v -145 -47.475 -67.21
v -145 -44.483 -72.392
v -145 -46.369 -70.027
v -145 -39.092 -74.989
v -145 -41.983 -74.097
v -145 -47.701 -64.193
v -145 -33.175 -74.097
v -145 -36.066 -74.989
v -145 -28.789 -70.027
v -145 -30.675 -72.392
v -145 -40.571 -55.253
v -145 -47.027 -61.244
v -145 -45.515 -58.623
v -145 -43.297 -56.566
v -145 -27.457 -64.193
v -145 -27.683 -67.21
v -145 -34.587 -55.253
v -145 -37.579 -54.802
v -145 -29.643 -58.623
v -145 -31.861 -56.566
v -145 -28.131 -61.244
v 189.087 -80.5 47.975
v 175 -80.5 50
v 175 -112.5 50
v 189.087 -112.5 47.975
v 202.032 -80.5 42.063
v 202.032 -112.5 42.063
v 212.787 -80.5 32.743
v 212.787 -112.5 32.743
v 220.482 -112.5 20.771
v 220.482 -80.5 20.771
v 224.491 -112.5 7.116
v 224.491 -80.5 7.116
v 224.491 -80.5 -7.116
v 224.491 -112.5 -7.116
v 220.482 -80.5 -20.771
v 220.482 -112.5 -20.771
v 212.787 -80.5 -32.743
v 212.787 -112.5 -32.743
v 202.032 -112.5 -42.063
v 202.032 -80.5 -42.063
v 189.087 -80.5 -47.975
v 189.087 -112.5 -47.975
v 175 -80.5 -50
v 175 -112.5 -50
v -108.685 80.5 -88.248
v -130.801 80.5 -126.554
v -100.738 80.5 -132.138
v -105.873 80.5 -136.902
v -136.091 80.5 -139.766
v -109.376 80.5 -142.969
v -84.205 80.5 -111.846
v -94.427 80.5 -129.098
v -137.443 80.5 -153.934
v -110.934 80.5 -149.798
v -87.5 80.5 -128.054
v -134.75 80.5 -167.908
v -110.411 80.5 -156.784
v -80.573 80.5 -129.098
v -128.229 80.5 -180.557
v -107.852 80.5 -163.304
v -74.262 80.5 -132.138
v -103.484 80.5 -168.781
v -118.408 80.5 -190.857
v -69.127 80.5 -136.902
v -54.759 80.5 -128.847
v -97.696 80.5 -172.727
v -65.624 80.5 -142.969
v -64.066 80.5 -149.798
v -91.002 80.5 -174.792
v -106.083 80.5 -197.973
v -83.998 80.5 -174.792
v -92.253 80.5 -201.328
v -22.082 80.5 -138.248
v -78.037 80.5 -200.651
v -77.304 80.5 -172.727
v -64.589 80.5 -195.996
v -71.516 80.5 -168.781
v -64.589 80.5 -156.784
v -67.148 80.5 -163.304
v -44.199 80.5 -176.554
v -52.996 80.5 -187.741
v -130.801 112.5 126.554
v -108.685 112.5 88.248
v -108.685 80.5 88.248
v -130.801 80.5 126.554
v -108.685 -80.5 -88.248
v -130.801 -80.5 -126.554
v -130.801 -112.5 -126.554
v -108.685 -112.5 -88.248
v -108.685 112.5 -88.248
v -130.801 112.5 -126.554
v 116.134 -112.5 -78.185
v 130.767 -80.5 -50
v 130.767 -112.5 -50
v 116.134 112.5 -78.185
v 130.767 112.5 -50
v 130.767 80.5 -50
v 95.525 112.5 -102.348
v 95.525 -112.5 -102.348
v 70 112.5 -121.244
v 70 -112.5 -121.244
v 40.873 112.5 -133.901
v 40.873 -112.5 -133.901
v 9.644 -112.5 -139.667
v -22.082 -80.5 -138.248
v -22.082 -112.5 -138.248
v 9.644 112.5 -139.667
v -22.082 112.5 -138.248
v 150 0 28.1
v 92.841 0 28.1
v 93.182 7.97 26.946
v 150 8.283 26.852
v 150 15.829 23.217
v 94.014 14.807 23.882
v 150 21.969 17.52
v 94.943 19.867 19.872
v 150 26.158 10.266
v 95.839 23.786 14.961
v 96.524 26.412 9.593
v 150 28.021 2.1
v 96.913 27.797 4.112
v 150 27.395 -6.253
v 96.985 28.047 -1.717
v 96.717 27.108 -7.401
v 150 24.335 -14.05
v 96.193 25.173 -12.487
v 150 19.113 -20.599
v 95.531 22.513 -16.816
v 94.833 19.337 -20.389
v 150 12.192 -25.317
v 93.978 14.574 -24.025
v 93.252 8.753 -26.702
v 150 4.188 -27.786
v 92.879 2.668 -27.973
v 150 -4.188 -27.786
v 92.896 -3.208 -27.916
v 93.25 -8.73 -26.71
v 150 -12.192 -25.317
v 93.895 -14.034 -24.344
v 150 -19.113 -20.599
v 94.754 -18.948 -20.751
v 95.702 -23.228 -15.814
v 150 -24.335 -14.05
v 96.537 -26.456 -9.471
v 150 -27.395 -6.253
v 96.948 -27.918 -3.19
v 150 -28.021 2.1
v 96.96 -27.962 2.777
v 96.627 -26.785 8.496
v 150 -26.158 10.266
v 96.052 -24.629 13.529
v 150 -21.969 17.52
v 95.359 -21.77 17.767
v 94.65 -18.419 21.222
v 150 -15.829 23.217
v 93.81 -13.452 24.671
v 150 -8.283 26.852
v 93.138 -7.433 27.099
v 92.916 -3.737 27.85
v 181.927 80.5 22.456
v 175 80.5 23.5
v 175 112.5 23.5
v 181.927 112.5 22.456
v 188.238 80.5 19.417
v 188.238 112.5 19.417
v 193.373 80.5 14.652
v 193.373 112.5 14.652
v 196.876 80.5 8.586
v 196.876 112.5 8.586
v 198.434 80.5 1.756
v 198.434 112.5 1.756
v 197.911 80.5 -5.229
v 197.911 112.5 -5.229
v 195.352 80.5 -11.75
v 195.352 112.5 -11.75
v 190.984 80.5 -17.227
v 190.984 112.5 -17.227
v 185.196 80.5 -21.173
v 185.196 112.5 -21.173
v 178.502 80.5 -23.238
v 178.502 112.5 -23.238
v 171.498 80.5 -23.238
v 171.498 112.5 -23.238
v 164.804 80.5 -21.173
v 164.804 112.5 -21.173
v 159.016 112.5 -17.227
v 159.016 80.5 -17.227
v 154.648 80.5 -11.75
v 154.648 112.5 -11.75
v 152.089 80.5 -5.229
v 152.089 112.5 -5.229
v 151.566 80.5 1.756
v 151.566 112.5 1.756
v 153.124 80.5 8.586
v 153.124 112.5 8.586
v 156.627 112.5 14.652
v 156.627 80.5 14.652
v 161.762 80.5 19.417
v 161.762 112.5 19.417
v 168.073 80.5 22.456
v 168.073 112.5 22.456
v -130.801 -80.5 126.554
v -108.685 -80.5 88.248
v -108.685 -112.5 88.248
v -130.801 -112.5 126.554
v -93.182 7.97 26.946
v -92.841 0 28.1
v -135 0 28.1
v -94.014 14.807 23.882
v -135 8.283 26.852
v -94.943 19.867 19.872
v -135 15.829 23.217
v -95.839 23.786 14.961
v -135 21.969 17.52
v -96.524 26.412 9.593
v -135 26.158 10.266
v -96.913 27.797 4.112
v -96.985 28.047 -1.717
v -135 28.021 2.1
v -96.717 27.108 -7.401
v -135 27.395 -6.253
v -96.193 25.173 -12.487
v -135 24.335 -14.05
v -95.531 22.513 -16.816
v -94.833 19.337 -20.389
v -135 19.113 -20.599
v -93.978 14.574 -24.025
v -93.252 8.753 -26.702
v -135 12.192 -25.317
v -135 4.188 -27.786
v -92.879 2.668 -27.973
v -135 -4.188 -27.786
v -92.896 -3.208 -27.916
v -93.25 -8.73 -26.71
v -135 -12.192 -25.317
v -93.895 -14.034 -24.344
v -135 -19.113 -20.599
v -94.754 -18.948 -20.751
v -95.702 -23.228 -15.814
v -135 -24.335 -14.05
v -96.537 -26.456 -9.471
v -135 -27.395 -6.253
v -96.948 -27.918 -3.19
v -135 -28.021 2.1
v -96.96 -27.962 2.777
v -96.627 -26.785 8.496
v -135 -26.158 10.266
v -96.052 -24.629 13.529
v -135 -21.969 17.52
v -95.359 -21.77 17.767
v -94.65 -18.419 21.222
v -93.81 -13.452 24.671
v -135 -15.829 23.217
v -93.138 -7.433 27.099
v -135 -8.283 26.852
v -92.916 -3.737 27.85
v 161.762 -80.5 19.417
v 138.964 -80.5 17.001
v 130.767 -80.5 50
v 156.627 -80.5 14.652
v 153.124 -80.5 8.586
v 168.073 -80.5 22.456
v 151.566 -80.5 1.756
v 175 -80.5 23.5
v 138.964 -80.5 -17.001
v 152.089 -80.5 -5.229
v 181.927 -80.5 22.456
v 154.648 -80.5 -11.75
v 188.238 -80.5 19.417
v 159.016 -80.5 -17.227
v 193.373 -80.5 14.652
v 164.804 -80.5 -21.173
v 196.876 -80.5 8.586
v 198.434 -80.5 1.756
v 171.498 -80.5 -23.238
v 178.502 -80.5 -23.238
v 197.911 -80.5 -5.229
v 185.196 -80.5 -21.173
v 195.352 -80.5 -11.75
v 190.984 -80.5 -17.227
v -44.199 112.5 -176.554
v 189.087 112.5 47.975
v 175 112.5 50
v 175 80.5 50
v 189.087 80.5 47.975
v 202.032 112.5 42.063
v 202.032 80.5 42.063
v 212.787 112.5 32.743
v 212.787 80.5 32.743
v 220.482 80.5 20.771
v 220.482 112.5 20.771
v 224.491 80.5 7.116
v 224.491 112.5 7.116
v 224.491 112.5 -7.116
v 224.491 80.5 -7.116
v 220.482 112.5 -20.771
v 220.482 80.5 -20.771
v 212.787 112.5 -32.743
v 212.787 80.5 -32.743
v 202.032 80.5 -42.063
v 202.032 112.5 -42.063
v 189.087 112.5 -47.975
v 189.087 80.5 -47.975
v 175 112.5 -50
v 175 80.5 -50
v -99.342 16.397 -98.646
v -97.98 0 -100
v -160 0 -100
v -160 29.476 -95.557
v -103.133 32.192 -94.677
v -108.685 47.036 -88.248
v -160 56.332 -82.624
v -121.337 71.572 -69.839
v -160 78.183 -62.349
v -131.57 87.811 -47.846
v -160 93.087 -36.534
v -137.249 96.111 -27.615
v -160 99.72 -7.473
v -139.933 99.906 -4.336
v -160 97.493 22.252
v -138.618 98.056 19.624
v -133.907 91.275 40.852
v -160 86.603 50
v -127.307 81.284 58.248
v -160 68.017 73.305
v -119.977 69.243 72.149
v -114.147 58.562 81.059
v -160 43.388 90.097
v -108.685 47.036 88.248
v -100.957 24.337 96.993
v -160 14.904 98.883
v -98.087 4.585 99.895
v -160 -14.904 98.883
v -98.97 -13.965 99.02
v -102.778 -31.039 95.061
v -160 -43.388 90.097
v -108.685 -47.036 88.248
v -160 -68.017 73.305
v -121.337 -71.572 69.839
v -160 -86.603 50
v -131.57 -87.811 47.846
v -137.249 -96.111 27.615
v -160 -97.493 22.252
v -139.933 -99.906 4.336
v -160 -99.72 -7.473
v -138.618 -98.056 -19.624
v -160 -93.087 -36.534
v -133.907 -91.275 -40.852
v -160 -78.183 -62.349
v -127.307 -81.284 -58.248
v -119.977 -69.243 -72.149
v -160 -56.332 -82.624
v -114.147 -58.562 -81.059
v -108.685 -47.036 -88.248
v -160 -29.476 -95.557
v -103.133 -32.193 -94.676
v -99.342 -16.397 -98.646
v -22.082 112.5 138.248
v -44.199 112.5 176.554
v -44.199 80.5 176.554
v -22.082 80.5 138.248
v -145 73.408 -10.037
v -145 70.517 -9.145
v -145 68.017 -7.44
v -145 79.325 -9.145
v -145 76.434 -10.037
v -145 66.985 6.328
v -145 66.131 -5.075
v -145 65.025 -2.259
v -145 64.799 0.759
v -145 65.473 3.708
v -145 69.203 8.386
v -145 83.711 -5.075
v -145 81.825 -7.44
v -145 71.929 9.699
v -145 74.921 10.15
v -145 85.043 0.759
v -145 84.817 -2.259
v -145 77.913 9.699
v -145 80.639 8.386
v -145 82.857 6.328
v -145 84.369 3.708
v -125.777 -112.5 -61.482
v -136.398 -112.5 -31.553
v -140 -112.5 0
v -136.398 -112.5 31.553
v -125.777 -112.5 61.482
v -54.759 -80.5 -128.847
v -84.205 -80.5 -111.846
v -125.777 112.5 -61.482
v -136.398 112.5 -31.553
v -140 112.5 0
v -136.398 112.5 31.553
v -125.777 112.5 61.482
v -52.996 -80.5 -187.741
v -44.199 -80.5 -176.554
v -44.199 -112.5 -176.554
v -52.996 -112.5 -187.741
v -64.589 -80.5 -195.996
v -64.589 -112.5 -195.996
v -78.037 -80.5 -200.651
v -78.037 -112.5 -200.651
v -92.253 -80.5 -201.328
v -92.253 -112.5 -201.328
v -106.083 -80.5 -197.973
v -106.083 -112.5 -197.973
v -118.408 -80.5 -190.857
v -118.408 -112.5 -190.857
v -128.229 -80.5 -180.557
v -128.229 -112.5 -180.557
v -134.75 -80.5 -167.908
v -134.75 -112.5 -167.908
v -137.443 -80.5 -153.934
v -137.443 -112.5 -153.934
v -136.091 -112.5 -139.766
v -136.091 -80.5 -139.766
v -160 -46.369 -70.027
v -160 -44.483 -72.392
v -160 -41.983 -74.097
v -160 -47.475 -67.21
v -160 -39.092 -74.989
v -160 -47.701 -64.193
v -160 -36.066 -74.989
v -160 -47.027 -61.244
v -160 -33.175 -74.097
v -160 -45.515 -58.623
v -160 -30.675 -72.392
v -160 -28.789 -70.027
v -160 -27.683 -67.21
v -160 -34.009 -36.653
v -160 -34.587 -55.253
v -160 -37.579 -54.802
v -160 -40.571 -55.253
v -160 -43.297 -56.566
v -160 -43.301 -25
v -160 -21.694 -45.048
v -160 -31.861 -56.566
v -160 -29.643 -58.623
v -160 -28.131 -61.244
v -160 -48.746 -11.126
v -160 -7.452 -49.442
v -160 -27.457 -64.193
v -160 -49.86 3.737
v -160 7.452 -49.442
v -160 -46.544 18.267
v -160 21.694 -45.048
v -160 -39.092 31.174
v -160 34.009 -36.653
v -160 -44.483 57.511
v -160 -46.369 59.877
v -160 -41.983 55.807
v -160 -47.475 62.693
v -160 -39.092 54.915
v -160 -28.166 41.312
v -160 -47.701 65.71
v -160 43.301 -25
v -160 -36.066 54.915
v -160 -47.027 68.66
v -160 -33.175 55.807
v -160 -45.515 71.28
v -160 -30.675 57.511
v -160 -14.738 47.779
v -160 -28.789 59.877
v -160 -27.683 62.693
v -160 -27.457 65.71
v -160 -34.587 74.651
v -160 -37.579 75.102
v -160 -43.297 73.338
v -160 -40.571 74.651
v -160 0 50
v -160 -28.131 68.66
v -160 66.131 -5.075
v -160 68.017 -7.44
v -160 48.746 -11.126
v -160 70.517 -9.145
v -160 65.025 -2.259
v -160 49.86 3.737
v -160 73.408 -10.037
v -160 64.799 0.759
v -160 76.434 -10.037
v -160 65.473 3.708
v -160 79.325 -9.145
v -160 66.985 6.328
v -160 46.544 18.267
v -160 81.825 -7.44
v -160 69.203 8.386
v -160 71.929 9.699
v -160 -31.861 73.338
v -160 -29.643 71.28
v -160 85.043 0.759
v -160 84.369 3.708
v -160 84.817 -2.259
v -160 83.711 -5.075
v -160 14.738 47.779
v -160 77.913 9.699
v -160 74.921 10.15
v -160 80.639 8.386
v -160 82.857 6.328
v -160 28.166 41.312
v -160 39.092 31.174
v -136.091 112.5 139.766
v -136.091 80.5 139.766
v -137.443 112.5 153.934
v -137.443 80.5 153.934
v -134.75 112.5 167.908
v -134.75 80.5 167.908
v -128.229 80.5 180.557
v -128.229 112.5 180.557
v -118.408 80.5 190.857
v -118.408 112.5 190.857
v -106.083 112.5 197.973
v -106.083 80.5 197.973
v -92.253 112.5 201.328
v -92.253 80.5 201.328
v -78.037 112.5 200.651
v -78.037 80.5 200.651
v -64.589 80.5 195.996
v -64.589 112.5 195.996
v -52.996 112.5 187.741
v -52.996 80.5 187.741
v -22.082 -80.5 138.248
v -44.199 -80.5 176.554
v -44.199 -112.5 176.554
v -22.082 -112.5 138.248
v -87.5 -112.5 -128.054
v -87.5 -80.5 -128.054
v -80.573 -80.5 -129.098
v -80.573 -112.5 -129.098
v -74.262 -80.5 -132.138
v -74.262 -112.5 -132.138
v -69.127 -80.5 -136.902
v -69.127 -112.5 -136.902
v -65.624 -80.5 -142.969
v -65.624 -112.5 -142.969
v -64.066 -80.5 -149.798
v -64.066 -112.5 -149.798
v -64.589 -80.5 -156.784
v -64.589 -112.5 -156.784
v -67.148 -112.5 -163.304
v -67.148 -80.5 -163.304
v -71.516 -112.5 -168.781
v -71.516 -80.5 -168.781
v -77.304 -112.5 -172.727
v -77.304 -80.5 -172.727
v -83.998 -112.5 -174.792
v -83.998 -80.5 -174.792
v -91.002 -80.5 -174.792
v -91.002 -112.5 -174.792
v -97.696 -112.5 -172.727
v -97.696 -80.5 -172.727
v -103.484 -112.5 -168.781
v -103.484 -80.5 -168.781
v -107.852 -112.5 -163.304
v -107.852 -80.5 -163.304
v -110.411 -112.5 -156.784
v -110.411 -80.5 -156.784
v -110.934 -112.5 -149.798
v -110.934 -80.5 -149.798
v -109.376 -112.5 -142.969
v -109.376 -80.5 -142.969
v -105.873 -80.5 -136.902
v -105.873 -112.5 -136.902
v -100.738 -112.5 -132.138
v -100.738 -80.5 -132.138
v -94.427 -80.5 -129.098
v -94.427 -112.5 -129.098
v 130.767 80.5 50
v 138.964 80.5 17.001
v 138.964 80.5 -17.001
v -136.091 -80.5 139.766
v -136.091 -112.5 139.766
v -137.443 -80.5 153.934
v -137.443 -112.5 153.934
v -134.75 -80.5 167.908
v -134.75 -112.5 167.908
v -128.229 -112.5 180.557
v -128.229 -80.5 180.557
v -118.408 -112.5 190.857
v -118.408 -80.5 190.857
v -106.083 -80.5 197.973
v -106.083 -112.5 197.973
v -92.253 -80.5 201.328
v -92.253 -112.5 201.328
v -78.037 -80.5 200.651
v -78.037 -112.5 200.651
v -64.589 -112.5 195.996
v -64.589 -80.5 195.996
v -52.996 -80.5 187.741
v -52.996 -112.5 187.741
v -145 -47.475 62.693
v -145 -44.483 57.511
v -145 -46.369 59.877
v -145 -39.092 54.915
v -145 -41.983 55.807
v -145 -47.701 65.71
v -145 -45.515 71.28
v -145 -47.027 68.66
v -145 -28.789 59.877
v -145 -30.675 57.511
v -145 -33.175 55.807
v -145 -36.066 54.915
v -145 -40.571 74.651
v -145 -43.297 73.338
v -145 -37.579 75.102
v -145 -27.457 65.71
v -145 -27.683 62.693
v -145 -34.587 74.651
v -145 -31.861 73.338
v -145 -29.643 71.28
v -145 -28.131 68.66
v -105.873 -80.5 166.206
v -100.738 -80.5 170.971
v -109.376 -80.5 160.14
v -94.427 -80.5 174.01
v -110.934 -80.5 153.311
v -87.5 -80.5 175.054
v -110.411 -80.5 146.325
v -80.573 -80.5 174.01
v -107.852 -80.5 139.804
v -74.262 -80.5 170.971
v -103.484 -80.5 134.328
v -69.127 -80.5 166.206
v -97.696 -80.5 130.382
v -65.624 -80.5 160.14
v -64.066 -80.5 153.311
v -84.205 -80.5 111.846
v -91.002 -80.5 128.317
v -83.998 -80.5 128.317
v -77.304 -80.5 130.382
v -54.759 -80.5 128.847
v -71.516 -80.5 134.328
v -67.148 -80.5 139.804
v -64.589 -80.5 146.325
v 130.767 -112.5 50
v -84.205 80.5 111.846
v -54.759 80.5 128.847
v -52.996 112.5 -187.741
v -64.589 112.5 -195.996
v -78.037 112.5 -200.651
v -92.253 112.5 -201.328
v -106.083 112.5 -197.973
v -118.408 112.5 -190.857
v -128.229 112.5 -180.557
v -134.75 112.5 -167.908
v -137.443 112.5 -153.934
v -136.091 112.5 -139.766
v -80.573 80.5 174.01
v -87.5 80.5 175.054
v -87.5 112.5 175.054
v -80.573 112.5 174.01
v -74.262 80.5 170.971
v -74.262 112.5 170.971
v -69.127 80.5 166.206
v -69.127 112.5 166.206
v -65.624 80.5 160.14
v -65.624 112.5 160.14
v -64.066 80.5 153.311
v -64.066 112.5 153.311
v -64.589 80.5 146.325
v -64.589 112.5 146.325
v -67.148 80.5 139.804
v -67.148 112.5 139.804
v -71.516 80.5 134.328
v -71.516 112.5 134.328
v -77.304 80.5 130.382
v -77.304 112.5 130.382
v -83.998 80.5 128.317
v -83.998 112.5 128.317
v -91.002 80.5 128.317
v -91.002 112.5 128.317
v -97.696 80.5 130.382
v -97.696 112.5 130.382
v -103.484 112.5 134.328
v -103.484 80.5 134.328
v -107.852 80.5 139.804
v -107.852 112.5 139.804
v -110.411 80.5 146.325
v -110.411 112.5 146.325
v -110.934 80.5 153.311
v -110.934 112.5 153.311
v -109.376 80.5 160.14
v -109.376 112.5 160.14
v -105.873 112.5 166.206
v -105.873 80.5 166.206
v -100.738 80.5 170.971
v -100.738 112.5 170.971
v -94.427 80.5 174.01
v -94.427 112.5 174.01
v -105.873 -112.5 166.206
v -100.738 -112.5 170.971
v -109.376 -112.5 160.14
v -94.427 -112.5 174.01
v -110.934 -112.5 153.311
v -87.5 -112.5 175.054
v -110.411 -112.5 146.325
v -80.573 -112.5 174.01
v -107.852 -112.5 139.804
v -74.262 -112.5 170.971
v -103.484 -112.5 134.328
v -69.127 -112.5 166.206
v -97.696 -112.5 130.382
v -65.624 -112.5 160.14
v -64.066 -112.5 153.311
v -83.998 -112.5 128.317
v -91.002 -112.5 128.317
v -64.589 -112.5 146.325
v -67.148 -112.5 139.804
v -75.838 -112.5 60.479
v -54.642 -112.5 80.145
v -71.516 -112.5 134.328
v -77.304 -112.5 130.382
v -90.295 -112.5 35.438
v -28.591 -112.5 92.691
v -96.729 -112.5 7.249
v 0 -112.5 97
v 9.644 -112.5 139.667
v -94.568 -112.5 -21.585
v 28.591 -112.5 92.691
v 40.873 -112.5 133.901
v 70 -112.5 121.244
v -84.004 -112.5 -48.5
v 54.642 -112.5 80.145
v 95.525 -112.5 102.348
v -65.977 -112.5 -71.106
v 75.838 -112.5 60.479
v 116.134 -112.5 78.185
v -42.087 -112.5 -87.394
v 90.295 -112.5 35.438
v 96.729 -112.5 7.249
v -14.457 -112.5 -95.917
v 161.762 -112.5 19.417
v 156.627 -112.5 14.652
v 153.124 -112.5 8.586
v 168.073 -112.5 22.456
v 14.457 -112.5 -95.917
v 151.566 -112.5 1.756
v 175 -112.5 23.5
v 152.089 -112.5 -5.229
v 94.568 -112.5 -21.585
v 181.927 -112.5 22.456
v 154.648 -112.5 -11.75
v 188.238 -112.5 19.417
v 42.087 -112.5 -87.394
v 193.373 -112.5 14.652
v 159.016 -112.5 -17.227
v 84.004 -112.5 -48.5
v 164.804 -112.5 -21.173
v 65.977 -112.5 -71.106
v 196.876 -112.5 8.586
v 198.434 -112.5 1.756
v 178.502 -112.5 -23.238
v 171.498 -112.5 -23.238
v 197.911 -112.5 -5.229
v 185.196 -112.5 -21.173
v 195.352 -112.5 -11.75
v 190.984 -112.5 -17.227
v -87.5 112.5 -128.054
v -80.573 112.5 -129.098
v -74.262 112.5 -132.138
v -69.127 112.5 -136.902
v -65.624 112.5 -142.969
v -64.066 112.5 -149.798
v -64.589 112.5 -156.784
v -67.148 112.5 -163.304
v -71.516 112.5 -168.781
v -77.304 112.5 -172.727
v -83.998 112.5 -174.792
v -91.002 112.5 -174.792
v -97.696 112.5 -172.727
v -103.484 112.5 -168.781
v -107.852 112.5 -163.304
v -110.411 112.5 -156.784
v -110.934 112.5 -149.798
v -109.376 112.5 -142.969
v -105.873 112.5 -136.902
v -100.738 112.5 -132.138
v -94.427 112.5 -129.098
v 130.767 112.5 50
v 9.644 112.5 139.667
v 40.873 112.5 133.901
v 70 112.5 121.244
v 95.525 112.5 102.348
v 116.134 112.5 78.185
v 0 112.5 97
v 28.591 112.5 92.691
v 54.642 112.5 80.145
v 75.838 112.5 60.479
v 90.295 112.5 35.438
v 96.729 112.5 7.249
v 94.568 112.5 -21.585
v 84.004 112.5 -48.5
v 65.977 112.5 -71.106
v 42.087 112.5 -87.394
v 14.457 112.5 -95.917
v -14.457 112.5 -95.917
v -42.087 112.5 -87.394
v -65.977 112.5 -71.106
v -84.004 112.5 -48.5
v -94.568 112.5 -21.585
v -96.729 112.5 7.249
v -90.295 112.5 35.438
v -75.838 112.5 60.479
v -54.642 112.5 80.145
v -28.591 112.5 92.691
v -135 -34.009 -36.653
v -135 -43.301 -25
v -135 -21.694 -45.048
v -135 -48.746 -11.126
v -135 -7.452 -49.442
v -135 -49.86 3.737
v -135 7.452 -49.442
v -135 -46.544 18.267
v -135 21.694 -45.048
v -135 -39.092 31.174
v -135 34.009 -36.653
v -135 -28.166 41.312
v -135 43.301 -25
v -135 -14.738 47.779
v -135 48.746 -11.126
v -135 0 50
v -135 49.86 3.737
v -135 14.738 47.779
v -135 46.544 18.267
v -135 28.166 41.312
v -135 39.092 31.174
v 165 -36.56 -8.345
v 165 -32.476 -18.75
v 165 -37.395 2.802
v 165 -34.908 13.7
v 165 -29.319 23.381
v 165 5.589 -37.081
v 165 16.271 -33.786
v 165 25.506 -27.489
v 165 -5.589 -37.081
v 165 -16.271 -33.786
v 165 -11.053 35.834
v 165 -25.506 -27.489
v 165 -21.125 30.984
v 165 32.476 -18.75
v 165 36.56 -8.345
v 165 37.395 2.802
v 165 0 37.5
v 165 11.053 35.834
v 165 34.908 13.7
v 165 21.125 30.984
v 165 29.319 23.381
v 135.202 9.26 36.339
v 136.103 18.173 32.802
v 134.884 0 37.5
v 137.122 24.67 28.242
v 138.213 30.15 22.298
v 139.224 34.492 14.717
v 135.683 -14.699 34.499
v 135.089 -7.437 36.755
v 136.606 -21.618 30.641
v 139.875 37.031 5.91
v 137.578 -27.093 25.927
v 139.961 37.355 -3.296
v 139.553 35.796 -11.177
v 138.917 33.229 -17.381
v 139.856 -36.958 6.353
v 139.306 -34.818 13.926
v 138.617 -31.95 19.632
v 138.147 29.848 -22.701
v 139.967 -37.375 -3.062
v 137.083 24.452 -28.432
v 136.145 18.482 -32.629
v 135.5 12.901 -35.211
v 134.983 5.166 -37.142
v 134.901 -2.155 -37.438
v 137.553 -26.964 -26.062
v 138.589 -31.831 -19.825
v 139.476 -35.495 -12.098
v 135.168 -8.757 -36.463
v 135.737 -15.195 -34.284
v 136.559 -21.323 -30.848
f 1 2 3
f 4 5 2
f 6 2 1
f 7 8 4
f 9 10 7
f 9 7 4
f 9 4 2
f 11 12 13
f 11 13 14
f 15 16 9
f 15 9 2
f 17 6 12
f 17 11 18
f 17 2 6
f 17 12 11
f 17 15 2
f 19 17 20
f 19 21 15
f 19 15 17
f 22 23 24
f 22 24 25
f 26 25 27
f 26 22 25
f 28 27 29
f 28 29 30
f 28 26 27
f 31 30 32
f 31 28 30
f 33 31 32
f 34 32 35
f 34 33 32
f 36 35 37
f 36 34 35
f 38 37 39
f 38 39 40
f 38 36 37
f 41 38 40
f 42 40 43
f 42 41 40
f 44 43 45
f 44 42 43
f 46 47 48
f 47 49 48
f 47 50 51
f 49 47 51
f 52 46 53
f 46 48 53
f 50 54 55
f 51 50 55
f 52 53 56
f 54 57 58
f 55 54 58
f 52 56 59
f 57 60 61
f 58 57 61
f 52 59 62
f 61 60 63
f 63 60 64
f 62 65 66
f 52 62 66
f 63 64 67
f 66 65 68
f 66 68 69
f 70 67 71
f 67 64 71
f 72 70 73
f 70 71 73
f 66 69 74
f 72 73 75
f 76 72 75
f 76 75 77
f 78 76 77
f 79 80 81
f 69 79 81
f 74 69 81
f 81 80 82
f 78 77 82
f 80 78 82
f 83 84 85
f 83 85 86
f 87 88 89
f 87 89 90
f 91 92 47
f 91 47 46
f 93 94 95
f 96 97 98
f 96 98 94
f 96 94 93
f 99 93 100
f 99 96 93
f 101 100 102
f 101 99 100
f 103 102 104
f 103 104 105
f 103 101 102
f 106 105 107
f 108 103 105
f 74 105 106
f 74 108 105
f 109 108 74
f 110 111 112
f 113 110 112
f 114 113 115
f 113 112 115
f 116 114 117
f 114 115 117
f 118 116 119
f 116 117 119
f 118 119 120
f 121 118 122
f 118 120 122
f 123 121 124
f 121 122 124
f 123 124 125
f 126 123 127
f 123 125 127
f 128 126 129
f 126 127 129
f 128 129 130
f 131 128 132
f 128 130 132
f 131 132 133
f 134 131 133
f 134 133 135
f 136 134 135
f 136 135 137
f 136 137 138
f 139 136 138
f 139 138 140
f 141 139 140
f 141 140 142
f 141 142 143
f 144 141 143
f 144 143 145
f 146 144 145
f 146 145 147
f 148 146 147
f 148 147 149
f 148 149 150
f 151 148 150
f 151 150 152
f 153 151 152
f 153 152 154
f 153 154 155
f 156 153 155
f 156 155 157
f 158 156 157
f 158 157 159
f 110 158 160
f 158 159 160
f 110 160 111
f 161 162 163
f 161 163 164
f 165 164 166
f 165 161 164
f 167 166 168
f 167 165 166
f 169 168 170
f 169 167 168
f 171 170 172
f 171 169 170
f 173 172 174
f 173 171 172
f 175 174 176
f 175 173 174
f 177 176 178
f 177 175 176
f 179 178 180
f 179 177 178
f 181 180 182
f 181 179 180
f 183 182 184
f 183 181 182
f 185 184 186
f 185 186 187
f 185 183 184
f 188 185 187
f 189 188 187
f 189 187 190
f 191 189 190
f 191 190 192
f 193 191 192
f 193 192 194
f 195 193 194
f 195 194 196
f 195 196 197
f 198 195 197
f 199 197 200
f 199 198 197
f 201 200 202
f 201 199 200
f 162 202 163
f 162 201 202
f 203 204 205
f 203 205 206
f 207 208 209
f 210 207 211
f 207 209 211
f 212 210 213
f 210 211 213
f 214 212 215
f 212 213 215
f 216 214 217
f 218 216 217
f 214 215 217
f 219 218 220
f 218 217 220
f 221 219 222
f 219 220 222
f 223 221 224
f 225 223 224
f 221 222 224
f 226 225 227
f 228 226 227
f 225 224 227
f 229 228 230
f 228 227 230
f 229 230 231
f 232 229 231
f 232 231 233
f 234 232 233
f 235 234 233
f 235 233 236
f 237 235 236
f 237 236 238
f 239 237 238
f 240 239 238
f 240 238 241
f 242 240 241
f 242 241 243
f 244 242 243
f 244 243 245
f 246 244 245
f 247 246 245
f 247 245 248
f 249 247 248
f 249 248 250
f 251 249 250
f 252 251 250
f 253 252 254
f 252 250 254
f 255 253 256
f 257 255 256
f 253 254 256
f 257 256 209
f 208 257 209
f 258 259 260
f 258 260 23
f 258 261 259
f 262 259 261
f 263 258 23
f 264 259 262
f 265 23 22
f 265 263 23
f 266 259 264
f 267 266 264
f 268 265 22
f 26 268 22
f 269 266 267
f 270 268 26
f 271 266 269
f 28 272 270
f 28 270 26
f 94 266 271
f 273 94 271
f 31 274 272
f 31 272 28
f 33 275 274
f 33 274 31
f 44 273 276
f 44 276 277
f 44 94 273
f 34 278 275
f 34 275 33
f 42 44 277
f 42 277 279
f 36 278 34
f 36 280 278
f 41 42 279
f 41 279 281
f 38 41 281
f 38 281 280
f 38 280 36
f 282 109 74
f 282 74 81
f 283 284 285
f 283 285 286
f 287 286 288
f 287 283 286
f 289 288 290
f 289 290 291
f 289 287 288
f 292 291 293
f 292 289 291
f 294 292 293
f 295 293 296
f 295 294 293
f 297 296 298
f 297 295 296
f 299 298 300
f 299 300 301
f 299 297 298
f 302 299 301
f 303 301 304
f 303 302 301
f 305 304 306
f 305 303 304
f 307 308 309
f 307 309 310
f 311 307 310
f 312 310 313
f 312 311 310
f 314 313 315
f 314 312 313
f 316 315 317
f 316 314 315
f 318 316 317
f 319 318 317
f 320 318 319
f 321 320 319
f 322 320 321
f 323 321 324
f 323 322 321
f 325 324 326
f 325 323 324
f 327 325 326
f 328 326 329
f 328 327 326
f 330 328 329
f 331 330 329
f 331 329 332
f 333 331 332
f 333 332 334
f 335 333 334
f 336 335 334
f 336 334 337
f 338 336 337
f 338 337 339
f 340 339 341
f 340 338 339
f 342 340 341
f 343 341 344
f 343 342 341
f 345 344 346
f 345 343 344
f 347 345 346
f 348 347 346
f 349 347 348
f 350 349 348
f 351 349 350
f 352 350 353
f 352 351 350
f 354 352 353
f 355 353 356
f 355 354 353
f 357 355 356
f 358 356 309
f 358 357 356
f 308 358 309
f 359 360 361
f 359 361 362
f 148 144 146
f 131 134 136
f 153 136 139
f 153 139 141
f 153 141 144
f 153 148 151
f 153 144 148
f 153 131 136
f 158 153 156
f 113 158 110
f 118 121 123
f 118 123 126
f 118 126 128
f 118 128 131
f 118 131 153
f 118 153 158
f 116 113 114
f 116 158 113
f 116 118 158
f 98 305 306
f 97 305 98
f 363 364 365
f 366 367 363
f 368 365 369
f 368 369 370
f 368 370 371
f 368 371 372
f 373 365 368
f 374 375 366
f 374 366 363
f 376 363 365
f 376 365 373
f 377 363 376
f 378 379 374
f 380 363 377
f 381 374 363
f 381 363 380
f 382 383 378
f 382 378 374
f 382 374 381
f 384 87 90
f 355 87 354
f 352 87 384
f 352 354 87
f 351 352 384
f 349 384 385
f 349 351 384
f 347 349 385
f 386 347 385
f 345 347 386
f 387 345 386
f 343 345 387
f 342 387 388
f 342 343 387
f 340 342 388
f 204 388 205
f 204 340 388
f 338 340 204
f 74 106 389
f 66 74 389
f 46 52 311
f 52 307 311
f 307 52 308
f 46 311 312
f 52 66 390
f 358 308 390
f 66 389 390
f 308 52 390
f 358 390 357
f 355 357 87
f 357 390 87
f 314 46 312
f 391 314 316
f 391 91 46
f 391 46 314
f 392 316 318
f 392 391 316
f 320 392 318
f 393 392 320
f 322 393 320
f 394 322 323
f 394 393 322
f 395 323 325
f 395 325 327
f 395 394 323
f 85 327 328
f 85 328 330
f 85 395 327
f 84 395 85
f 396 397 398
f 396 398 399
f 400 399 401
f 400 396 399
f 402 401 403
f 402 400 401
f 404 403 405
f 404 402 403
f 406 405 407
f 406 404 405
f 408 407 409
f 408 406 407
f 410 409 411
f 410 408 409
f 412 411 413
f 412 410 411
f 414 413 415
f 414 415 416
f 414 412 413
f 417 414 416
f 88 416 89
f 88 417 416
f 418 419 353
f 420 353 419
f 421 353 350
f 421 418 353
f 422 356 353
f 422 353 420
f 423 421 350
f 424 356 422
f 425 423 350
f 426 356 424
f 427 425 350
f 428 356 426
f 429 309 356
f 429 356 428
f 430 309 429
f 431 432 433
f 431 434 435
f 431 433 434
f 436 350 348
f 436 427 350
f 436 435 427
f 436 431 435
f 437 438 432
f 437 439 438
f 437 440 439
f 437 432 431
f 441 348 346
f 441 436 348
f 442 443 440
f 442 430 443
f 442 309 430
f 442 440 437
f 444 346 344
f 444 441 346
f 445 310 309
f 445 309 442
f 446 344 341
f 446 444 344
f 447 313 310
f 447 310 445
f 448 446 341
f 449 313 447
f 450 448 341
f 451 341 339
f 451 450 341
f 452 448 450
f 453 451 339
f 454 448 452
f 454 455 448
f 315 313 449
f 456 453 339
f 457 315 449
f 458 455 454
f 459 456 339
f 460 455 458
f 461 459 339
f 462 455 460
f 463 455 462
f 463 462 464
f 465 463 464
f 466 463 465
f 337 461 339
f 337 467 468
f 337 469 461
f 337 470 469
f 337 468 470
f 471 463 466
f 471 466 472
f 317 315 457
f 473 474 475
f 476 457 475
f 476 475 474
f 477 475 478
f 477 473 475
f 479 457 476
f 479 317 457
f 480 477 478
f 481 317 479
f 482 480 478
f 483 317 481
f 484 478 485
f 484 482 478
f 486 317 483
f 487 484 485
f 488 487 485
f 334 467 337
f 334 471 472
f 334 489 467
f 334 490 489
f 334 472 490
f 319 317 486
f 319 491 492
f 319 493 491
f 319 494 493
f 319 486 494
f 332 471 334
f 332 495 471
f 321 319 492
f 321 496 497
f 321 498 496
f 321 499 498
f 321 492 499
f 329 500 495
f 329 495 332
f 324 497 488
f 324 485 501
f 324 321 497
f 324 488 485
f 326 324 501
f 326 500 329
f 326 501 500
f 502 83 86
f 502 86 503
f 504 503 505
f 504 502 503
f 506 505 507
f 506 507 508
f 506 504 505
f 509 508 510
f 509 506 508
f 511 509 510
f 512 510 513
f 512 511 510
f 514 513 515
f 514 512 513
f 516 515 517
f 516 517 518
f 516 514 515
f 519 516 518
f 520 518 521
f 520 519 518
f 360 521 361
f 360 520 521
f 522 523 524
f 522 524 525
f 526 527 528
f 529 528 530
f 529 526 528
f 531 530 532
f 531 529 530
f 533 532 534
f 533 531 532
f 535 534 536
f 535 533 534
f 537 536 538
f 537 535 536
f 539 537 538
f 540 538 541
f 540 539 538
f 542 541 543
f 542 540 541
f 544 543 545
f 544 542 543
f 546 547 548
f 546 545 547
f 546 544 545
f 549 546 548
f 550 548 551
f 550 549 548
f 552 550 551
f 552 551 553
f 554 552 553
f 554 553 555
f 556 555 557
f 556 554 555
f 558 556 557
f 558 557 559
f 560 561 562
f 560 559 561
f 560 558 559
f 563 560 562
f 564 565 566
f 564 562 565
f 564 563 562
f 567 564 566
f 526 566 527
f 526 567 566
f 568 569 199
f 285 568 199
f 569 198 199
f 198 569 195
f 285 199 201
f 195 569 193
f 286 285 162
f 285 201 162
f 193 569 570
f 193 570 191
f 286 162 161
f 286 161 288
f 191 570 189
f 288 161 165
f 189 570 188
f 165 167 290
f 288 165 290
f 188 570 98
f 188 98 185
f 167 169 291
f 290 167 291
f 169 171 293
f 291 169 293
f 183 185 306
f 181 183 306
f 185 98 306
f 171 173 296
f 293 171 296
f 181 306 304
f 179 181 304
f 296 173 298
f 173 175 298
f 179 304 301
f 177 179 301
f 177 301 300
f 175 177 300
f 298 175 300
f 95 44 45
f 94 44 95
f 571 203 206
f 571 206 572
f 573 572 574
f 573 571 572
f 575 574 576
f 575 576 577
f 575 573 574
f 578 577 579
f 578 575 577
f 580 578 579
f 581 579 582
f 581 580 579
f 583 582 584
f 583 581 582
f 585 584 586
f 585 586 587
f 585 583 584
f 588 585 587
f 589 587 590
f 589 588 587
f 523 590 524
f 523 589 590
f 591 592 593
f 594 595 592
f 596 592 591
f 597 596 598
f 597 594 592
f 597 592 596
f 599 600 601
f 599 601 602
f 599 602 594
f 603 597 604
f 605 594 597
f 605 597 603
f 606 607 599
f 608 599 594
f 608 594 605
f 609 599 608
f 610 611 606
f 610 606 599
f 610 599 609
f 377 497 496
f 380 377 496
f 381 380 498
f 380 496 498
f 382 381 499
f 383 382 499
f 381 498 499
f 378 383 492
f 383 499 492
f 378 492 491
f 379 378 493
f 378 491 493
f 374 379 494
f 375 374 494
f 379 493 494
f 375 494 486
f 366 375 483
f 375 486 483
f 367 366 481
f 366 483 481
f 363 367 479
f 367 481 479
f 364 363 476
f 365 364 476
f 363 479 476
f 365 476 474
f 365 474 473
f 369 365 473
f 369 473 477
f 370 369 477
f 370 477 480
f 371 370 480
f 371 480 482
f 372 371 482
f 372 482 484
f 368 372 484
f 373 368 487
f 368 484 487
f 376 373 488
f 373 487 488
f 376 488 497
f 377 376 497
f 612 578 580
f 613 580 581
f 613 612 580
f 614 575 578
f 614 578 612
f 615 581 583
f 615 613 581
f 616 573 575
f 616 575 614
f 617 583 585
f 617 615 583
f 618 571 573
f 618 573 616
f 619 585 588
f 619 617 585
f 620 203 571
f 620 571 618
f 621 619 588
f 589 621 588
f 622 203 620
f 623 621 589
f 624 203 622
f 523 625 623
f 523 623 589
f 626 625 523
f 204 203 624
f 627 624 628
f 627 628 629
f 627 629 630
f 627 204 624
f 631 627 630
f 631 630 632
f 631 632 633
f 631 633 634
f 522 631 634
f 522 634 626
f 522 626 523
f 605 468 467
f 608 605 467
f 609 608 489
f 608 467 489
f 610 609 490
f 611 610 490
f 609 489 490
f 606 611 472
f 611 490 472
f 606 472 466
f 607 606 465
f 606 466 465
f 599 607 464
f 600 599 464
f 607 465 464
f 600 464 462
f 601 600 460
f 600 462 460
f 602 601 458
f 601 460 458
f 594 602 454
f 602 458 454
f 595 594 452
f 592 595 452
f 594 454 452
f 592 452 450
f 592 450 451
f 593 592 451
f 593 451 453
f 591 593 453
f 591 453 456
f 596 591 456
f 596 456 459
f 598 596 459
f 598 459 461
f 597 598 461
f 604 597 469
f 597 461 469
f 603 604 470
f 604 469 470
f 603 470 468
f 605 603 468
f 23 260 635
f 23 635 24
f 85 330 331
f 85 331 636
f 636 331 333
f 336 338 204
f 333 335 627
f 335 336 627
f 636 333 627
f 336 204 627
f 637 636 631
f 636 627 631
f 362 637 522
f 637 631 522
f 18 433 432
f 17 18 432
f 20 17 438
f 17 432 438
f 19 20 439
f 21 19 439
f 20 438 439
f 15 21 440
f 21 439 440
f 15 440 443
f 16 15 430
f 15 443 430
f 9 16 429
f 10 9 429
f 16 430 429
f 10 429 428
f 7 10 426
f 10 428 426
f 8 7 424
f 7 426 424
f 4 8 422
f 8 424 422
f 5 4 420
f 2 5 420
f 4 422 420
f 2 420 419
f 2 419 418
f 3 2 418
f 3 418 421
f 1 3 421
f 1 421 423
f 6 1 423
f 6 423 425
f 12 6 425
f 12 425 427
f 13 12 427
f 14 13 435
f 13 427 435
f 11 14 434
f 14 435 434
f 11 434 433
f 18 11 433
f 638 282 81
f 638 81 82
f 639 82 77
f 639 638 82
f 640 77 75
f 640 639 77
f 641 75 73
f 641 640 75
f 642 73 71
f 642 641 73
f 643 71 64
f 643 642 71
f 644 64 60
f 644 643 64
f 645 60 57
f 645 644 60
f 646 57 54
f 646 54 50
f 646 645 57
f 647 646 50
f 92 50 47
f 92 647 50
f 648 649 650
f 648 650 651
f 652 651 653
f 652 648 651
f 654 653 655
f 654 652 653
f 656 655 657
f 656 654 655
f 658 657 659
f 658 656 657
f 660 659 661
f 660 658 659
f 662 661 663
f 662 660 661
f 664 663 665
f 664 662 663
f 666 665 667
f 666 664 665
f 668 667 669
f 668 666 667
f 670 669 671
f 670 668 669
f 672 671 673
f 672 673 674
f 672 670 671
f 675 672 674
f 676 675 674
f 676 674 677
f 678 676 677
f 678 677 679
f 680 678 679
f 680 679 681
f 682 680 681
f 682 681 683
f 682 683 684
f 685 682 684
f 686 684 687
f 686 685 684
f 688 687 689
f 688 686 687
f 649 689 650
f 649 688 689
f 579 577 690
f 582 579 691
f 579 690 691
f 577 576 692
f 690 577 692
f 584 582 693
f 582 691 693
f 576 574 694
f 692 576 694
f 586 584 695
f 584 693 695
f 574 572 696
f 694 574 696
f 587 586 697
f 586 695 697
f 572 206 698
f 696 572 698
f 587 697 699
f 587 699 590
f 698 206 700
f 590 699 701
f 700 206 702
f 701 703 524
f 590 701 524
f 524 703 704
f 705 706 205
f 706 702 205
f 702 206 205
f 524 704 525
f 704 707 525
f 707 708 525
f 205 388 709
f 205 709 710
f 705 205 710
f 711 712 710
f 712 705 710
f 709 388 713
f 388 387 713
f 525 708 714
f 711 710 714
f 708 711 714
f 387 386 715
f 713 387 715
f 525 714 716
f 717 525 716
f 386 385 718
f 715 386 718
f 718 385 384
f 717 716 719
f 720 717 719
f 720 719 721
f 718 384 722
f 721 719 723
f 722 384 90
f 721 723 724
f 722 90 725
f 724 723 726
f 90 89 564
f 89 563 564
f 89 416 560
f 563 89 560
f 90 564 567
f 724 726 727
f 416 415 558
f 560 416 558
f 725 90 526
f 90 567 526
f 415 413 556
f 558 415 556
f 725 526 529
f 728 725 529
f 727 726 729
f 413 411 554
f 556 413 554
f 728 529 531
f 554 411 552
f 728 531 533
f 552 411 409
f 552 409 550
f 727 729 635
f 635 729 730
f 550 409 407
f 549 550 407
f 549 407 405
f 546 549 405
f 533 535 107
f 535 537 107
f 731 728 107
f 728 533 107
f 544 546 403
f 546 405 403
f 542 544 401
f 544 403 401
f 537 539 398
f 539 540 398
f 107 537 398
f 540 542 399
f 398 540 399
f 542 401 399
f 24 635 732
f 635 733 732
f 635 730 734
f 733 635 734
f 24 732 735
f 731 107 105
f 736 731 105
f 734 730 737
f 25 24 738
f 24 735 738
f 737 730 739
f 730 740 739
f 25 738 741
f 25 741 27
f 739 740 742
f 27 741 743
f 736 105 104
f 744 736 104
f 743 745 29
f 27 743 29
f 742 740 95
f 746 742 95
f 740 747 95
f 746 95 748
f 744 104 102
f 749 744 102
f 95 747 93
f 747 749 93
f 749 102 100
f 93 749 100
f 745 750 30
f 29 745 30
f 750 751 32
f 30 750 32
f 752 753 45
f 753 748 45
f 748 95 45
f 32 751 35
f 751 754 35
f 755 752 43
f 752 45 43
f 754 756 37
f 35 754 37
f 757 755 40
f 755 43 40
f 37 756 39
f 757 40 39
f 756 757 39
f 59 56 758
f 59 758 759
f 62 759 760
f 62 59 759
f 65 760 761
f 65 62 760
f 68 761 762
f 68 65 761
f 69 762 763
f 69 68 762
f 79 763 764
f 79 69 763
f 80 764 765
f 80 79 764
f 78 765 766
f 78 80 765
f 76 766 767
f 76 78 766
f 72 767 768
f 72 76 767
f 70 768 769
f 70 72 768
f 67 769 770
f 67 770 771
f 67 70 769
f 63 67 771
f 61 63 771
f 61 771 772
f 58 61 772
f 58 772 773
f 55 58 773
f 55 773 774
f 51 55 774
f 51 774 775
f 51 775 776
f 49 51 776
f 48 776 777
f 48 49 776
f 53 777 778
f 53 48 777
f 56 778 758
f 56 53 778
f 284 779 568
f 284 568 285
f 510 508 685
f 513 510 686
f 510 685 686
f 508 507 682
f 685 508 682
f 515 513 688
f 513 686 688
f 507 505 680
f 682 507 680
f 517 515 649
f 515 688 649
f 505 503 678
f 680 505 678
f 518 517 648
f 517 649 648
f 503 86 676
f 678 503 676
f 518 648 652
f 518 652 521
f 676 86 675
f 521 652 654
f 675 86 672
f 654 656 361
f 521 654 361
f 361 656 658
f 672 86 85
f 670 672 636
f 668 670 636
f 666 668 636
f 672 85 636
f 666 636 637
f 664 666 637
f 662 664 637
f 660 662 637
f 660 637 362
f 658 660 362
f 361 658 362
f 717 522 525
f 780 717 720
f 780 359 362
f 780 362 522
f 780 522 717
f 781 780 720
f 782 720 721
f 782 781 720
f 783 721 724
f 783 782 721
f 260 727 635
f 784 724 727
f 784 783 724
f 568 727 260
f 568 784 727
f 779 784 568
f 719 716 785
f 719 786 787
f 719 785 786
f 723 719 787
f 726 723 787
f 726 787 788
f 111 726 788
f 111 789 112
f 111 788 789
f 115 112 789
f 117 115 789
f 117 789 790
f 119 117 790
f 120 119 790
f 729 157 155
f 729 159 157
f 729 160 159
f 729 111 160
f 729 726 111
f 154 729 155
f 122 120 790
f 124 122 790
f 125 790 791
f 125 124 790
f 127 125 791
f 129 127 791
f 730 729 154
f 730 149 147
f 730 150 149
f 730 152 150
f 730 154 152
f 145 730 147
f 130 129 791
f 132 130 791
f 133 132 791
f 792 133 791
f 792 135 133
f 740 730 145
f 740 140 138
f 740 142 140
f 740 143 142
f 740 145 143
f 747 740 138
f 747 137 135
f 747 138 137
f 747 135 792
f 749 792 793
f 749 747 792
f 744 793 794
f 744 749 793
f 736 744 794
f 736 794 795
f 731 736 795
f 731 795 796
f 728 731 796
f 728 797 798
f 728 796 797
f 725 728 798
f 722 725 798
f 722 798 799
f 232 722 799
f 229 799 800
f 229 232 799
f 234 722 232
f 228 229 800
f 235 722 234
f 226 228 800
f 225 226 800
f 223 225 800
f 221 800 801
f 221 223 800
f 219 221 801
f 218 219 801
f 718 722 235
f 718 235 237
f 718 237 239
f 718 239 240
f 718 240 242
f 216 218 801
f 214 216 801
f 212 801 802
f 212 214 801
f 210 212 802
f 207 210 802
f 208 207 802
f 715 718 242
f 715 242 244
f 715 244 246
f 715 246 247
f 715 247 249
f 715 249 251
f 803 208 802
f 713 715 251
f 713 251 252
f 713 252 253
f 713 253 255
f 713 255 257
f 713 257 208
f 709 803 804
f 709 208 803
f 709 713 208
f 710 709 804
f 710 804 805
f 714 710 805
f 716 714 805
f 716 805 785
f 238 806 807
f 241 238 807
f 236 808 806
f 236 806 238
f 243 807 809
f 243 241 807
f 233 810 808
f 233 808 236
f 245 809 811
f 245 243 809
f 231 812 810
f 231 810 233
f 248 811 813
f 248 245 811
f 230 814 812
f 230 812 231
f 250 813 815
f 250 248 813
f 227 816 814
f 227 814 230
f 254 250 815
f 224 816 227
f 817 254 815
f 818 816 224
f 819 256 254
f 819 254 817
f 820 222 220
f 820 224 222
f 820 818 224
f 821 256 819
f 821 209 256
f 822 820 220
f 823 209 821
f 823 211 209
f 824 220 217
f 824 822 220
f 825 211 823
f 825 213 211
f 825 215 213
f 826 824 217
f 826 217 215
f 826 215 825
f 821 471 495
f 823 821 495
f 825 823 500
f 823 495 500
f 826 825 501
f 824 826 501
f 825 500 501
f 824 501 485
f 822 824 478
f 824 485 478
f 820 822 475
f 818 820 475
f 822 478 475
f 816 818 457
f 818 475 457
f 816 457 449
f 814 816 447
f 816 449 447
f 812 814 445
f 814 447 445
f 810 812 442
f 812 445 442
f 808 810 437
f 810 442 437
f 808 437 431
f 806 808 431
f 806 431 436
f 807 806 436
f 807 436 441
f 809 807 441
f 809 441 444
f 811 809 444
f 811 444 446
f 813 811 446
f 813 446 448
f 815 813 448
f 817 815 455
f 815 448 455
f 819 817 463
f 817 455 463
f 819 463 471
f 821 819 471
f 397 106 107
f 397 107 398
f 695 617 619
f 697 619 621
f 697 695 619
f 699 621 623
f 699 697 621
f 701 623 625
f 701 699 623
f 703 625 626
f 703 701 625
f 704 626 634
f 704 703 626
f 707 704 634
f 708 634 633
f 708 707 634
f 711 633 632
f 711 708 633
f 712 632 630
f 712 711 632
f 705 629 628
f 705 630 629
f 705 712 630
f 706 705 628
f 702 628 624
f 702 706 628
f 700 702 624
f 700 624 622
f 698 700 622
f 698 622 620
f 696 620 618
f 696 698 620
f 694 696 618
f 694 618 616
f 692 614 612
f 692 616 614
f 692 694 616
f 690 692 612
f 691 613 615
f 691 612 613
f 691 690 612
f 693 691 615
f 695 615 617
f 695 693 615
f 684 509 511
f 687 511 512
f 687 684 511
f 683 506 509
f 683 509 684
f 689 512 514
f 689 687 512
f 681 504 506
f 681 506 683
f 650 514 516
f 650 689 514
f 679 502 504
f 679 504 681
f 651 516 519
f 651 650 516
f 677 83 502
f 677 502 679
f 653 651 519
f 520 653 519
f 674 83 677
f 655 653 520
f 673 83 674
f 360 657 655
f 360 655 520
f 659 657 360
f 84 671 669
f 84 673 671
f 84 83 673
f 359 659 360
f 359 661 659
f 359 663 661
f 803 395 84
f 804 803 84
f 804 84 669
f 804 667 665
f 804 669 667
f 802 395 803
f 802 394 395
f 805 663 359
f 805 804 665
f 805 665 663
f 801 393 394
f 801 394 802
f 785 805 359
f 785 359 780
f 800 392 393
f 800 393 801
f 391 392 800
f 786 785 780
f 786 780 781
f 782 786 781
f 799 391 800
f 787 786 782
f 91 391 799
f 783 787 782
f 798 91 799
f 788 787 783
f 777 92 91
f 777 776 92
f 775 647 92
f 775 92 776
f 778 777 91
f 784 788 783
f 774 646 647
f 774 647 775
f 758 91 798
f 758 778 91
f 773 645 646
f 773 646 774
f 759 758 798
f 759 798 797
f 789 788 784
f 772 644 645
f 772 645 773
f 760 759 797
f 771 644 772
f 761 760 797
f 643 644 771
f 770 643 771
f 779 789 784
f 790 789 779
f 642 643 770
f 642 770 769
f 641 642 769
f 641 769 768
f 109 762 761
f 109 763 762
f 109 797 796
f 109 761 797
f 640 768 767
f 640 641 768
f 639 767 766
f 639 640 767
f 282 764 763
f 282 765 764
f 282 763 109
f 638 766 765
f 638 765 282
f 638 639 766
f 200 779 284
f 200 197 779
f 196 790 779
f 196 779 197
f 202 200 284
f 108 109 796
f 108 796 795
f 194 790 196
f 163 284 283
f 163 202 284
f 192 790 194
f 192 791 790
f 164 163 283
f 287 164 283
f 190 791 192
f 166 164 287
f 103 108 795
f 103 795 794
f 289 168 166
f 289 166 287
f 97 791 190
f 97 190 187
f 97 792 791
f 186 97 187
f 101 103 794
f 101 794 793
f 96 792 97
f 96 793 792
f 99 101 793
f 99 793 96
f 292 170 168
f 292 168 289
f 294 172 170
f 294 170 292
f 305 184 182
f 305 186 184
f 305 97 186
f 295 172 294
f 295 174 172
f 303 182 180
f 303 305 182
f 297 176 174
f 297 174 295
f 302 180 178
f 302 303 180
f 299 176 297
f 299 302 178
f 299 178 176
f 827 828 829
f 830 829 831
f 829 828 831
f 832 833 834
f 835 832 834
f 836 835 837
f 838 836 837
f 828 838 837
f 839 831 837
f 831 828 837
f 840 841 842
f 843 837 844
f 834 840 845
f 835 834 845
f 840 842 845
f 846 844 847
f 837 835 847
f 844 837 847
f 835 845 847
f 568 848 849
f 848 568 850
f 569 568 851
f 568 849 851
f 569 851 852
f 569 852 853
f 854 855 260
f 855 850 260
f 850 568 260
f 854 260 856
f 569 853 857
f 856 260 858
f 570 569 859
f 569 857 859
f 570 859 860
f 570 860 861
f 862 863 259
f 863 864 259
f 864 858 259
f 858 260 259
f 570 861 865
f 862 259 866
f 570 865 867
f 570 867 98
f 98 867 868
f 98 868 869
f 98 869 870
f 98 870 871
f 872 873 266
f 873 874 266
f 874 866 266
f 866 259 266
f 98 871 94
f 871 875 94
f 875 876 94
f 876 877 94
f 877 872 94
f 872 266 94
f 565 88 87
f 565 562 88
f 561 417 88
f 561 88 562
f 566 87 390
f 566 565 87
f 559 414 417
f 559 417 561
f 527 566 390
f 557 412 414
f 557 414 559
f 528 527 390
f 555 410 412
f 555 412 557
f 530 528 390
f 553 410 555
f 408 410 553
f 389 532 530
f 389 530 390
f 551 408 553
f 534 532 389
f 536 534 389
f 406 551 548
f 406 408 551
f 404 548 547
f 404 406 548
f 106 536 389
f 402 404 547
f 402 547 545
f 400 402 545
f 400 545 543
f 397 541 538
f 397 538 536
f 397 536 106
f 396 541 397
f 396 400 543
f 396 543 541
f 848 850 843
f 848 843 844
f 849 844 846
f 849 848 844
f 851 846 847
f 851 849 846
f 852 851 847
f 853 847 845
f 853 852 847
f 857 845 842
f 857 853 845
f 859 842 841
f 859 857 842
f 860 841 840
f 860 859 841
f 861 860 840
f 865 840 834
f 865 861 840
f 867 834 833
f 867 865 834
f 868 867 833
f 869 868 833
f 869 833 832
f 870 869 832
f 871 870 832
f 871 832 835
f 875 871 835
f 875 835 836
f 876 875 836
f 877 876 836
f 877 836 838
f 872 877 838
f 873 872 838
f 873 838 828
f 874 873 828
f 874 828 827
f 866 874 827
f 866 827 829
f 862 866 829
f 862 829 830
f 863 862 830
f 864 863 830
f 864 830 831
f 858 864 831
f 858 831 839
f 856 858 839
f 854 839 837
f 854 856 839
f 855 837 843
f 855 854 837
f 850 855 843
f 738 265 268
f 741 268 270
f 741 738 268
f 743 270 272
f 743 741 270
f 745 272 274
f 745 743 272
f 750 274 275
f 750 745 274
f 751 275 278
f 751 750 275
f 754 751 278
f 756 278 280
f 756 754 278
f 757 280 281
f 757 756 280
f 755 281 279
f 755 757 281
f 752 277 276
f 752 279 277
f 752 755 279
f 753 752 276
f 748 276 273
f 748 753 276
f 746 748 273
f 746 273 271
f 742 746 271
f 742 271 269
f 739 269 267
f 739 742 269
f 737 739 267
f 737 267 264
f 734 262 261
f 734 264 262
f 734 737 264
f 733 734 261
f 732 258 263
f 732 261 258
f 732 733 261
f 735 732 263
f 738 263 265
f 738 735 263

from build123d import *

# Parameters (mm, degrees)
SKETCH1_R               = 23.5
BOSS_EXTRUDE1_DEPTH     = 112.5
SKETCH2_OUTSIDE_W       = 484.702
SKETCH2_OUTSIDE_H       = 522.81
SKETCH2_OUTSIDE_R       = 140
CUT_EXTRUDE2_DEPTH      = 80.5
SKETCH3_R               = 100
BOSS_EXTRUDE2_DEPTH     = 160
SKETCH5_R               = 37.5
BOSS_EXTRUDE3_DEPTH     = 325
SKETCH6_R               = 28.1
CUT_EXTRUDE3_DEPTH      = 310
SKETCH7_R               = 50
CUT_EXTRUDE4_DEPTH      = 25
SKETCH8_R               = 10.15
CUT_EXTRUDE5_DEPTH      = 15
CUT_EXTRUDE6_DEPTH      = 323.343674653
CUT_EXTRUDE6_DEPTH_BACK = 323.343674653
SKETCH9_R               = 97


with BuildPart() as part:
    # Sketch1 → Boss-Extrude1 (new, symmetric)
    with BuildSketch(Plane(origin=(0, 0, 0), x_dir=(1, 0, 0), z_dir=(0, 1, 0))):
        with BuildLine():
            Line((175, 50), (130.766968306, 50))
            ThreePointArc((130.766968306, 50), (70, 121.24355653), (-22.082213964, 138.247516529))
            Line((-22.082213964, 138.247516529), (-44.198729811, 176.554445662))
            ThreePointArc((-44.198729811, 176.554445662), (-112.5, 194.855715852), (-130.801270189, 126.554445662))
            Line((-130.801270189, 126.554445662), (-108.684754342, 88.247516529))
            ThreePointArc((-108.684754342, 88.247516529), (-140, 0), (-108.684754342, -88.247516529))
            Line((-108.684754342, -88.247516529), (-130.801270189, -126.554445662))
            ThreePointArc((-130.801270189, -126.554445662), (-112.5, -194.855715851), (-44.198729811, -176.554445662))
            Line((-44.198729811, -176.554445662), (-22.082213964, -138.247516529))
            ThreePointArc((-22.082213964, -138.247516529), (70, -121.24355653), (130.766968306, -50))
            Line((130.766968306, -50), (175, -50))
            ThreePointArc((175, -50), (225, 0), (175, 50))
        make_face()
        with Locations(Location((175, 0, 0), (0, 0, 270))):
            Circle(SKETCH1_R, mode=Mode.SUBTRACT)
        with Locations(Location((-87.5, 151.554445662, 0), (0, 0, 270))):
            Circle(SKETCH1_R, mode=Mode.SUBTRACT)
        with Locations(Location((-87.5, -151.554445662, 0), (0, 0, 270))):
            Circle(SKETCH1_R, mode=Mode.SUBTRACT)
    extrude(amount=BOSS_EXTRUDE1_DEPTH, both=True)

    # Sketch2 outside → Cut-Extrude2 (cut, symmetric)
    with BuildSketch(Plane(origin=(0, 0, 0), x_dir=(1, 0, 0), z_dir=(0, 1, 0))):
        with Locations((42.5, 0)):
            Rectangle(SKETCH2_OUTSIDE_W, SKETCH2_OUTSIDE_H)
        with Locations(Location((0, 0, 0), (0, 0, 99.075167572))):
            Circle(SKETCH2_OUTSIDE_R, mode=Mode.SUBTRACT)
    extrude(amount=CUT_EXTRUDE2_DEPTH, both=True, mode=Mode.SUBTRACT)

    # Sketch3 → Boss-Extrude2 (add)
    with BuildSketch(Plane(origin=(0, 0, 0), x_dir=(0, 0, -1), z_dir=(1, 0, 0))):
        Circle(SKETCH3_R)
    extrude(amount=-BOSS_EXTRUDE2_DEPTH)

    # Sketch5 → Boss-Extrude3 (add)
    with BuildSketch(Plane.ZY.offset(160)):
        Circle(SKETCH5_R)
    extrude(amount=-BOSS_EXTRUDE3_DEPTH)

    # Sketch6 → Cut-Extrude3 (cut)
    with BuildSketch(Plane.ZY.offset(160)):
        Circle(SKETCH6_R)
    extrude(amount=-CUT_EXTRUDE3_DEPTH, mode=Mode.SUBTRACT)

    # Sketch7 → Cut-Extrude4 (cut)
    with BuildSketch(Plane.ZY.offset(160)):
        Circle(SKETCH7_R)
    extrude(amount=-CUT_EXTRUDE4_DEPTH, mode=Mode.SUBTRACT)

    # Sketch8 → Cut-Extrude5 (cut)
    with BuildSketch(Plane.ZY.offset(160)):
        with Locations((0, 74.921014489)):
            Circle(SKETCH8_R)
        with Locations((64.951905284, -37.578985511)):
            Circle(SKETCH8_R)
        with Locations((-64.951905284, -37.578985511)):
            Circle(SKETCH8_R)
    extrude(amount=-CUT_EXTRUDE5_DEPTH, mode=Mode.SUBTRACT)

    # Sketch9 → Cut-Extrude6 (cut, two sides: drawn at the far end of the back side and taken through both)
    with BuildSketch(Plane(origin=(0, 0, 0), x_dir=(1, 0, 0), z_dir=(0, 1, 0)).offset(-CUT_EXTRUDE6_DEPTH_BACK)):
        with Locations(Location((0, 0, 0), (0, 0, 270))):
            Circle(SKETCH9_R)
    extrude(amount=CUT_EXTRUDE6_DEPTH + CUT_EXTRUDE6_DEPTH_BACK, mode=Mode.SUBTRACT)


solid = part.part
